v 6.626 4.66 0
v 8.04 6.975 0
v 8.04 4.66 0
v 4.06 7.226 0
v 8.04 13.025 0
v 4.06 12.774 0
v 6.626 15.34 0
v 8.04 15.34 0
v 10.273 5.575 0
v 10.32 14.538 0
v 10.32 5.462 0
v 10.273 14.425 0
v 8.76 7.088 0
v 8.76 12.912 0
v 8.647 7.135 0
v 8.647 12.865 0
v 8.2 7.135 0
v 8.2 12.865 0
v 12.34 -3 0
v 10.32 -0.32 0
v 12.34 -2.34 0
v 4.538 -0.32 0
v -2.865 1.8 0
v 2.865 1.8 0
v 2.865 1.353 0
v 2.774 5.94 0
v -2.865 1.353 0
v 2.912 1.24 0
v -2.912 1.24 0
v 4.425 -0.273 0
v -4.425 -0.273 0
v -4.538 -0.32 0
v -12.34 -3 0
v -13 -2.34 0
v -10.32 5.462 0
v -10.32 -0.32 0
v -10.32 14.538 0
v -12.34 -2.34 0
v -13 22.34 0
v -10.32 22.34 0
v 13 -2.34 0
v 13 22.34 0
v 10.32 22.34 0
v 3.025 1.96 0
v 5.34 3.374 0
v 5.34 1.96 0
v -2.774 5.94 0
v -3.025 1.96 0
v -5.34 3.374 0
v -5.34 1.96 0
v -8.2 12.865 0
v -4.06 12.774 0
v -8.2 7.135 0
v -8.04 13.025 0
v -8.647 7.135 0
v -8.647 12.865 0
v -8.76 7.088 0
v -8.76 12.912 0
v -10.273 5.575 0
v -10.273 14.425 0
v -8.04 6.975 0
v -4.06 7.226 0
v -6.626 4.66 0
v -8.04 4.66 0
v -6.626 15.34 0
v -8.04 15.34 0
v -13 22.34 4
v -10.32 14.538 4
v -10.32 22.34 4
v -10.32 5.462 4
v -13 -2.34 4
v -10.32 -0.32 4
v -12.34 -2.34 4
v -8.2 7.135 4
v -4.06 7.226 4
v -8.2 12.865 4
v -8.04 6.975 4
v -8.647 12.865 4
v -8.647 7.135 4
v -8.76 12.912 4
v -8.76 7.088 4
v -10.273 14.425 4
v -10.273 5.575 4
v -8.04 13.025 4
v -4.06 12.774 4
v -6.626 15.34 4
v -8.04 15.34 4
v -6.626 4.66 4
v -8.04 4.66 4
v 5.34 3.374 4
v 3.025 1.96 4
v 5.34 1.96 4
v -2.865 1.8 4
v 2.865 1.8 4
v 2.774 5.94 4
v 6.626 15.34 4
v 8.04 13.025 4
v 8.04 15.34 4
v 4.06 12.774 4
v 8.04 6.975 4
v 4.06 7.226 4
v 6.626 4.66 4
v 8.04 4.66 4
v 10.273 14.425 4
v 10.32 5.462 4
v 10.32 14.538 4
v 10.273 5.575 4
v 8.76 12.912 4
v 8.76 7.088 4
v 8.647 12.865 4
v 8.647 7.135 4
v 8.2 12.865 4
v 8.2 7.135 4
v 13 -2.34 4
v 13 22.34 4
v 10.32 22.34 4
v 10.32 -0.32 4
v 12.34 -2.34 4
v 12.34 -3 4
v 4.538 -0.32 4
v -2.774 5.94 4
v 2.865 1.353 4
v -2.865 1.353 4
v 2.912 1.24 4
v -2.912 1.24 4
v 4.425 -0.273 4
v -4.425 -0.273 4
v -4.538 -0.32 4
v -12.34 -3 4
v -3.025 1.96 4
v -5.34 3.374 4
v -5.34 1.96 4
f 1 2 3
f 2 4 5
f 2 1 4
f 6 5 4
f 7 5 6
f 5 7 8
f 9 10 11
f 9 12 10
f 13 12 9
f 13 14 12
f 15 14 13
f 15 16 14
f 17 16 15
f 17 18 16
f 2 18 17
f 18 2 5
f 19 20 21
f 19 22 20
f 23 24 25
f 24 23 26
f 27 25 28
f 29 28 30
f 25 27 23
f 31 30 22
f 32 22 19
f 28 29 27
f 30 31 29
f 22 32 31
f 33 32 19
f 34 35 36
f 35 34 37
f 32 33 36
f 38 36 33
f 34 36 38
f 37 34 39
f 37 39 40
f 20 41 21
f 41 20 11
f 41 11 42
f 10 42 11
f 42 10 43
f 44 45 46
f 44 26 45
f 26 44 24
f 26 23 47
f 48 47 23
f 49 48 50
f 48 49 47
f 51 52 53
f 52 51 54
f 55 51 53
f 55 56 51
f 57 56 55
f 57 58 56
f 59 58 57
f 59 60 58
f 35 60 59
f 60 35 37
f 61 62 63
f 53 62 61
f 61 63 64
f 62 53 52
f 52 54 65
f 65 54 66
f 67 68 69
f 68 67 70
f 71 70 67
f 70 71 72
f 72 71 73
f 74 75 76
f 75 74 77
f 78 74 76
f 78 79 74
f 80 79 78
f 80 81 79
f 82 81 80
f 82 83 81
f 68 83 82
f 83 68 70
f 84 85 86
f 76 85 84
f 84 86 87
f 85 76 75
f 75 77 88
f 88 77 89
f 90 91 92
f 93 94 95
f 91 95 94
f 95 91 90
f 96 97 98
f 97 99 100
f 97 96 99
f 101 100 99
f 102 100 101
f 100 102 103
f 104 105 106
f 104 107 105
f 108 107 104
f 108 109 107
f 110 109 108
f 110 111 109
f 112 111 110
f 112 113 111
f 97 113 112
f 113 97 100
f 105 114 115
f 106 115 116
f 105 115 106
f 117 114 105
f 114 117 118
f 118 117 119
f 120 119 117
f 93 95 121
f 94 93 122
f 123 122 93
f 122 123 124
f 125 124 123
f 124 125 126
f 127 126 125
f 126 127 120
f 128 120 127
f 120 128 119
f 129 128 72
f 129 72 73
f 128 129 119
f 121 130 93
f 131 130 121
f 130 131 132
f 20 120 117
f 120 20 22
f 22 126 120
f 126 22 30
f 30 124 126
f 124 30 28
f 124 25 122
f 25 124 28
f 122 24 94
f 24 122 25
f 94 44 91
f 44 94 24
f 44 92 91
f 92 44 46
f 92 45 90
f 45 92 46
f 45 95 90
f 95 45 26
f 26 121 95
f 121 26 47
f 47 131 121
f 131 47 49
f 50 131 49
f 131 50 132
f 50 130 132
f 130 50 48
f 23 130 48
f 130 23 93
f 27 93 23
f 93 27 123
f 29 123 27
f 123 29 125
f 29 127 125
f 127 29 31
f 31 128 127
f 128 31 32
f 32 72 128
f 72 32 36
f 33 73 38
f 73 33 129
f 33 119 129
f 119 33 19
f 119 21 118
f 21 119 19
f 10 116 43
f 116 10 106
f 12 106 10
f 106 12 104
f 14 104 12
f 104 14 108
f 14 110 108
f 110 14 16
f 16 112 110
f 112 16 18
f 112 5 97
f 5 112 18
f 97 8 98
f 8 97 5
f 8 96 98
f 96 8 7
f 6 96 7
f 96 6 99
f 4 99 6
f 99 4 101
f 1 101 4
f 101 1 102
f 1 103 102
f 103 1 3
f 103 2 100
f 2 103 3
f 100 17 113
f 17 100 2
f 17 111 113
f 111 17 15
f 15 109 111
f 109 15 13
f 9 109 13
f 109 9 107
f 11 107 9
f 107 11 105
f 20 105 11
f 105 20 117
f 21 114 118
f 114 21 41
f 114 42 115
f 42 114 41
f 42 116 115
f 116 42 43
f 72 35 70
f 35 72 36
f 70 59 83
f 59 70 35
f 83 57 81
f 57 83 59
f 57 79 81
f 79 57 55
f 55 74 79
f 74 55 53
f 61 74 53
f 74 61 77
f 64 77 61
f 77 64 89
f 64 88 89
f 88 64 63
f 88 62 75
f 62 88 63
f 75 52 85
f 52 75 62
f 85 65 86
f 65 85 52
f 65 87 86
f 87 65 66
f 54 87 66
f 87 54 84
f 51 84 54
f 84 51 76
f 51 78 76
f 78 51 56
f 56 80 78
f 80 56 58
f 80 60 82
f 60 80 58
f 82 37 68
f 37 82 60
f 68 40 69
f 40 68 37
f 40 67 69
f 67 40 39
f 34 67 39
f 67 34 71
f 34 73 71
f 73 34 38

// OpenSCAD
L1=6.05;// 6.2mm funciona con tolerancia de 0.20mm
L2=11;
h2=1.64;
h1=4.3-h2;
L3=5.68; 
w1=1.8;  // grosor de pestaña
t1=0.160; // mpultimate 0.17 funciona 
//kobraeno 0.175 
// 2040 funciona con t1=0.20
//funciona 0.10
L4=25; //ancho pieza
w2=3;
cor=[[-L2/2,-h2],[-L2/2,0],[-L3/2,h1],[L3/2,h1],[L2/2,0],[L2/2,-h2]];
hex=4;
module p2020(){
translate([0,w1]){
linear_extrude(hex)
offset(-t1){
translate([0,h2])
polygon(cor);
polygon([[-L1/2,0],[L1/2,0],[L1/2,-w1-t1],[-L1/2,-w1-t1]]);
translate([0,-w1-t1])
polygon([[-L4/2,0],[L4/2,0],[L4/2,-w2],[-L4/2,-w2]]);

intersection(){
translate([0,-5.2]) //-5.0 is tight -5.2 loose
rotate(45)
square([11.,11.],center=true);
square([10,9],center=true);
}
}
}
}

p2020();
translate([10,10])
rotate(90)
p2020();
translate([-10,10])
rotate(-90)
p2020();
